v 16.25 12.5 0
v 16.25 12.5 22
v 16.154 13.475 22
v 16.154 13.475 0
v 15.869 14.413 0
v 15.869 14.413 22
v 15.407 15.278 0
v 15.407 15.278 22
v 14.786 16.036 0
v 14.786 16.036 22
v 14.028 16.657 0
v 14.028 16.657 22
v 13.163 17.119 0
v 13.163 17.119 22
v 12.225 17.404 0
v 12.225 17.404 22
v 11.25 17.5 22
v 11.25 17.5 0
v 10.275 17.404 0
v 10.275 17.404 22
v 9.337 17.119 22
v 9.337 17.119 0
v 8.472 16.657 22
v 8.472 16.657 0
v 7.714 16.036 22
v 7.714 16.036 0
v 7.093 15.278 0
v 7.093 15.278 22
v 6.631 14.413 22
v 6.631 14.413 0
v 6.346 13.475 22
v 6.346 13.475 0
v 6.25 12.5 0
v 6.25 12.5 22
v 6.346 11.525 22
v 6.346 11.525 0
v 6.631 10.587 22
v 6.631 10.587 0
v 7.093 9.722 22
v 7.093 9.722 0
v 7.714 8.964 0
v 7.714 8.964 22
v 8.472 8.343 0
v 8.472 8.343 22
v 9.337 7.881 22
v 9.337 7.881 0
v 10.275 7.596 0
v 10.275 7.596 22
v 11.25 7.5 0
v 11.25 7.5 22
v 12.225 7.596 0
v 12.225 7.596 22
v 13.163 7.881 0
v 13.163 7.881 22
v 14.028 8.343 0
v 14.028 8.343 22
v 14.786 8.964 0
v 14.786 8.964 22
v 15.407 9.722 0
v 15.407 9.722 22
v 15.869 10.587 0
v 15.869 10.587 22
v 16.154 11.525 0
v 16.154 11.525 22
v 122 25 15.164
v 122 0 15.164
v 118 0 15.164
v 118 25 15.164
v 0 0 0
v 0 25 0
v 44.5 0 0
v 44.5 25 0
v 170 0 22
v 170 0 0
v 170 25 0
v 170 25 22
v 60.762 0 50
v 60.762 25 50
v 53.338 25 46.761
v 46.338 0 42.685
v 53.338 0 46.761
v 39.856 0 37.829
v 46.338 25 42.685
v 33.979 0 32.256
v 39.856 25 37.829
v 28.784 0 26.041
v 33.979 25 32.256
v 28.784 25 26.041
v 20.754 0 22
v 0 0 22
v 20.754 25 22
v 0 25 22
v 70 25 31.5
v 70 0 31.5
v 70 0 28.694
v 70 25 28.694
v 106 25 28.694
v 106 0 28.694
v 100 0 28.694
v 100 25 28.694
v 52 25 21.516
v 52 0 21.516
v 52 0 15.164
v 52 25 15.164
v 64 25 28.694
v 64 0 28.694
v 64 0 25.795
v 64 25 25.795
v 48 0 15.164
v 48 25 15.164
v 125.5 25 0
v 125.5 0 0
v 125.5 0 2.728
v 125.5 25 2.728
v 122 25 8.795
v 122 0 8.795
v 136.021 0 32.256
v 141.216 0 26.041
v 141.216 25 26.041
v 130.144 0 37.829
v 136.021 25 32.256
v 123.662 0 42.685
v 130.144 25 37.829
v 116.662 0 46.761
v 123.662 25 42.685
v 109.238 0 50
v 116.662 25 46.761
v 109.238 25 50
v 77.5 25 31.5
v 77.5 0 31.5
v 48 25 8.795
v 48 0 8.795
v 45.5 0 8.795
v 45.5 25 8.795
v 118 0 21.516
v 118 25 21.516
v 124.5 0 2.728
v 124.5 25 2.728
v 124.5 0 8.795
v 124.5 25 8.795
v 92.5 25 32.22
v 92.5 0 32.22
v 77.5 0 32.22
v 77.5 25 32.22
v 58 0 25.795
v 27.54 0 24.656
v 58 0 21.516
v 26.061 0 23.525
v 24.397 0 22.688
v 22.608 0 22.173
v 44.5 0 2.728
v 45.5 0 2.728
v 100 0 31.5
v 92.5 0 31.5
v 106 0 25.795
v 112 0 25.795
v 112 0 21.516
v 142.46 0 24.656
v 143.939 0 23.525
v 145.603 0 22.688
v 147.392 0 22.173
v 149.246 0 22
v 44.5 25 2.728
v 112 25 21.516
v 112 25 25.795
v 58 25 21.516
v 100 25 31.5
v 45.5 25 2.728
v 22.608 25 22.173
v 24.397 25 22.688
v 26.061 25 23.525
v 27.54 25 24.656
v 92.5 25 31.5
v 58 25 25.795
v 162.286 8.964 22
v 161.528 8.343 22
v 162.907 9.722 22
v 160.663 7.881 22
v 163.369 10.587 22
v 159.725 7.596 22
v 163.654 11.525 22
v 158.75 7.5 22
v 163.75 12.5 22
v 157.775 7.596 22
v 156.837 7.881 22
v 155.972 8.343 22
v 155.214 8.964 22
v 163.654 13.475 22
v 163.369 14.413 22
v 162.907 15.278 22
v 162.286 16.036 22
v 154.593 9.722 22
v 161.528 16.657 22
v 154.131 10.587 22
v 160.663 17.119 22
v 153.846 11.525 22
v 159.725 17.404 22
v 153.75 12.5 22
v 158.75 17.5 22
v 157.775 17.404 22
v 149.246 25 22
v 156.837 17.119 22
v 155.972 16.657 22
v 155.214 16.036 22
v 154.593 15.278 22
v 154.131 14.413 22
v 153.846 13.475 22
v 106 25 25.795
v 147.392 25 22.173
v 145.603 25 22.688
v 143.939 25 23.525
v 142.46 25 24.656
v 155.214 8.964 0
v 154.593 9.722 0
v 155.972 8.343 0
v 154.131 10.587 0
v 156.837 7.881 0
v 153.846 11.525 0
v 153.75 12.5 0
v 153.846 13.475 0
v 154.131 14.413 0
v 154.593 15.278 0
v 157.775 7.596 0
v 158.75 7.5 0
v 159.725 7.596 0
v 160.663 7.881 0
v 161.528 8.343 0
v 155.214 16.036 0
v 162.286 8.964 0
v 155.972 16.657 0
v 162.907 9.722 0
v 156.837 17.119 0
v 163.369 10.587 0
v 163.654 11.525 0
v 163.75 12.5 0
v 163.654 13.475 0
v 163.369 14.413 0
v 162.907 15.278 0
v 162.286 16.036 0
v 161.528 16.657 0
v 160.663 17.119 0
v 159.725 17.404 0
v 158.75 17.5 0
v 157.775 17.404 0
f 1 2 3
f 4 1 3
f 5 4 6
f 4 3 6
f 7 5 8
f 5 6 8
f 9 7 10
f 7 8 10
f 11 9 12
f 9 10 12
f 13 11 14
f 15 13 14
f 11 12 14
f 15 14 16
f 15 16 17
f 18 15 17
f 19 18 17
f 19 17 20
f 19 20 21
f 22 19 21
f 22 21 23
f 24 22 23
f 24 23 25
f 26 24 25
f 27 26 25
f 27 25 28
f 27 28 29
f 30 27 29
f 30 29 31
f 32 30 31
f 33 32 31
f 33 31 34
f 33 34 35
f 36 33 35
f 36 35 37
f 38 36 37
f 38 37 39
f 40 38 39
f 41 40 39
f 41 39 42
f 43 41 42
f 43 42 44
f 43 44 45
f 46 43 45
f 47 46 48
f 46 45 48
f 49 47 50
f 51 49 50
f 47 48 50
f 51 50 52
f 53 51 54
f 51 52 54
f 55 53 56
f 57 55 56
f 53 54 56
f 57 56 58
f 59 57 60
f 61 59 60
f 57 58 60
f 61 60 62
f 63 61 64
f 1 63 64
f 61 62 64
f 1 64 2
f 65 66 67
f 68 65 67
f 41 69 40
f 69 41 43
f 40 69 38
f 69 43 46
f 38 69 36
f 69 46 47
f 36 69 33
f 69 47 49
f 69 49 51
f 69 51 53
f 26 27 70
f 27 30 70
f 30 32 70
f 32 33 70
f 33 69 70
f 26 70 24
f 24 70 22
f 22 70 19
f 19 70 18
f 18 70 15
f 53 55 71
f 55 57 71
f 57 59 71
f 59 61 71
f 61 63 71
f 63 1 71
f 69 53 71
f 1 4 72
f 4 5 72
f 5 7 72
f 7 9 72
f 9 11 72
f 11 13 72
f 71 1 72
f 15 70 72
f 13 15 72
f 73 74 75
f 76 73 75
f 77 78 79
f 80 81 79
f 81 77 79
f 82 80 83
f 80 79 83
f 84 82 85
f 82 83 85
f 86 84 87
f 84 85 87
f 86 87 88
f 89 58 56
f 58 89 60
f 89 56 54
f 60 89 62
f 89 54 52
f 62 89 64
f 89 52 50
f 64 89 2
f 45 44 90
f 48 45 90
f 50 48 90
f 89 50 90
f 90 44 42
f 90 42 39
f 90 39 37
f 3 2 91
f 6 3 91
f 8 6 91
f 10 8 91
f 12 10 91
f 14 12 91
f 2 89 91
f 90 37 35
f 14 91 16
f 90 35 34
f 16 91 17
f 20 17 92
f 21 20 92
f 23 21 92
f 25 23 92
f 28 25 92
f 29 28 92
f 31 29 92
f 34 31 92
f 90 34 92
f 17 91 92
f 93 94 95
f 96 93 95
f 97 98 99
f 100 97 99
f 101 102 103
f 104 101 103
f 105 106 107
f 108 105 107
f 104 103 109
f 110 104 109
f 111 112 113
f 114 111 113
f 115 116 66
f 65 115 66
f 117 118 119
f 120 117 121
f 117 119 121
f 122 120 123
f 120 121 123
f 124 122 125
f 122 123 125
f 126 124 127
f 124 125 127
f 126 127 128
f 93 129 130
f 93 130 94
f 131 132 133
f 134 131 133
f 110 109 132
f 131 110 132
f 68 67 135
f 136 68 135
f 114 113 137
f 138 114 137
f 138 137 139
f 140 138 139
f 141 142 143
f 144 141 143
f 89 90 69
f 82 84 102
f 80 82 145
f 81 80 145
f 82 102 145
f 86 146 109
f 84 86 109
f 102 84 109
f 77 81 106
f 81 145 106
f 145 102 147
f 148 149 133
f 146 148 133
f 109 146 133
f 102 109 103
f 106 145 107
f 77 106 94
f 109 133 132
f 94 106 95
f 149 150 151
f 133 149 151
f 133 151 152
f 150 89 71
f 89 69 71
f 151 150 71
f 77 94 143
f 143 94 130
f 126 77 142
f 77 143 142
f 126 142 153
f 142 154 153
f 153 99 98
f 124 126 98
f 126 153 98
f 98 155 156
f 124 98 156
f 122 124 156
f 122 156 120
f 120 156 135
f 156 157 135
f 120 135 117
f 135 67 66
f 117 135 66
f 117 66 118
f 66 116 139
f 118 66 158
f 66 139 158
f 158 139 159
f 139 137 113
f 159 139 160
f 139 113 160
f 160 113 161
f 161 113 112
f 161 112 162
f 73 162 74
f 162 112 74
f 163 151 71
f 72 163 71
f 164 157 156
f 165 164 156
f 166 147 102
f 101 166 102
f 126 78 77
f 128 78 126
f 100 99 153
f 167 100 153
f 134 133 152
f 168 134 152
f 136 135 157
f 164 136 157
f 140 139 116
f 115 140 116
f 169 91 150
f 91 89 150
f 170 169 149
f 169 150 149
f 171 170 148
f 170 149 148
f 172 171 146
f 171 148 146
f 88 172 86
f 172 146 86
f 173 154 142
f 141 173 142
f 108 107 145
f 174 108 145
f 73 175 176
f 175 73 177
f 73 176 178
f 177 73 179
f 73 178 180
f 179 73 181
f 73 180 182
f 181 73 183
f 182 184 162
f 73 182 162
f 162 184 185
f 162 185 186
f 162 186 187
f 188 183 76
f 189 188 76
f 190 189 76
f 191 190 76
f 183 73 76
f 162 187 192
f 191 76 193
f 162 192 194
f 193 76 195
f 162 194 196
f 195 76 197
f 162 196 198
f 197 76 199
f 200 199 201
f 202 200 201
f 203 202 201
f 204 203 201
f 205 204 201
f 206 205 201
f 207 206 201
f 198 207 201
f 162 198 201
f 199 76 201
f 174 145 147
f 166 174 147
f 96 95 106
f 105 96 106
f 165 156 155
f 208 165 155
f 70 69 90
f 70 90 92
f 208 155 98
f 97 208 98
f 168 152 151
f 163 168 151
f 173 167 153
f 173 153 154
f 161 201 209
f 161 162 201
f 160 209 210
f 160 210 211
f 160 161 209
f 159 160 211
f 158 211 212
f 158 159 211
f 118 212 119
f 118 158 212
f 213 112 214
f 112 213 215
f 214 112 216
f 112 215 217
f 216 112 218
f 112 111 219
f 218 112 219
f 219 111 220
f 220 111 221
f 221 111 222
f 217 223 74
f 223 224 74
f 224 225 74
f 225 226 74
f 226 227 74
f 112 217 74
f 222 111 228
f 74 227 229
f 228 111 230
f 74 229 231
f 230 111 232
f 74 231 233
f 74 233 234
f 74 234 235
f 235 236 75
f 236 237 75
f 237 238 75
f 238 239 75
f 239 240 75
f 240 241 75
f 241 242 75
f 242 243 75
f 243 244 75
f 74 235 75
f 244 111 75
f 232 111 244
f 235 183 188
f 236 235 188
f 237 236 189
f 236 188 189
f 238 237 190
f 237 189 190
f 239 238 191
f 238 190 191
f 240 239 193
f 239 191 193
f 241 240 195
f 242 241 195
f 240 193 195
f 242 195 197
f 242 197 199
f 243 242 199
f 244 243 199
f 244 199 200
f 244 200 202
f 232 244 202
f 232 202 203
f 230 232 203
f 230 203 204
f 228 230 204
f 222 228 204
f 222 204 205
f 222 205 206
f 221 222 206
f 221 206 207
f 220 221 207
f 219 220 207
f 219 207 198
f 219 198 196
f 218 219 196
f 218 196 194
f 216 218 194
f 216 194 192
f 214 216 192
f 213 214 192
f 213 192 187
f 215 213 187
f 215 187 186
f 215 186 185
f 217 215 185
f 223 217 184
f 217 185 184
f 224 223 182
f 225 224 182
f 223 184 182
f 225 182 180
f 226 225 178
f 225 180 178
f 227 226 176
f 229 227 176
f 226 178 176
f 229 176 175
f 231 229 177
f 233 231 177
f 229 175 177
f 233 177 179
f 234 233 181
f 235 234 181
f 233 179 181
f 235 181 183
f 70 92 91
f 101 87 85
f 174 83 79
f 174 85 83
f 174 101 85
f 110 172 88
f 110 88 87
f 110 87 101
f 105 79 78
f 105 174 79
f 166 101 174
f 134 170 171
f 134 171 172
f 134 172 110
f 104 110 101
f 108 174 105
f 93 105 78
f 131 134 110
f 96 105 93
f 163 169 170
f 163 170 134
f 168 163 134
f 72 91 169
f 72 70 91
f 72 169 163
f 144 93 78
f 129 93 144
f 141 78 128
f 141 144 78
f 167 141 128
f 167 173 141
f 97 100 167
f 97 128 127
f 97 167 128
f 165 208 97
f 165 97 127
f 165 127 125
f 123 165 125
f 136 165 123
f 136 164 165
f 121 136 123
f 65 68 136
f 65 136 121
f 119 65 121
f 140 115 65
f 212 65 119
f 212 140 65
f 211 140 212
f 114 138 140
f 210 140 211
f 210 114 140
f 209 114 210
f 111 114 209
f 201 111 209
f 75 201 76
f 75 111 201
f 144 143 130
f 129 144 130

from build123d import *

# Parameters (mm, degrees)
F0_W     = 170
F0_H     = 25
F1_DEPTH = 50
F2_R     = 5
F3_DEPTH = 50.001
F5_DEPTH = 25.001
F7_DEPTH = 25.001
F8_R     = 10


with BuildPart() as f1:
    # F0 (on Top) → F1 (new body)
    with BuildSketch(Plane.XY):
        with Locations((85, 12.5)):
            Rectangle(F0_W, F0_H)
    extrude(amount=F1_DEPTH)

    # F2 (on face) → F3 (cut, through all)
    with BuildSketch(Plane.XY.offset(50)):
        with Locations((11.25, 12.5)):
            Circle(F2_R)
        with Locations((158.75, 12.5)):
            Circle(F2_R)
    extrude(amount=-F3_DEPTH, mode=Mode.SUBTRACT)

    # F4 (on face) → F5 (cut, through all)
    with BuildSketch(Plane.XZ):
        Polygon((100, 31.5), (92.5, 31.5), (92.5, 32.220282), (85, 32.220282), (77.5, 32.220282), (77.5, 31.5), (70, 31.5), (70, 28.694315), (64, 28.694315), (64, 25.794553), (58, 25.794553), (58, 21.515869), (52, 21.515869), (52, 15.164459), (48, 15.164459), (48, 8.794946), (45.5, 8.794946), (45.5, 2.727922), (44.5, 2.727922), (44.5, 0), (125.5, 0), (125.5, 2.727922), (124.5, 2.727922), (124.5, 8.794946), (122, 8.794946), (122, 15.164459), (118, 15.164459), (118, 21.515869), (112, 21.515869), (112, 25.794553), (106, 25.794553), (106, 28.694315), (100, 28.694315), align=None)
    extrude(amount=-F5_DEPTH, mode=Mode.SUBTRACT)

    # F6 (on face) → F7 (cut, through all)
    with BuildSketch(Plane(origin=(0, 25, 0), x_dir=(-1, 0, 0), z_dir=(0, 1, 0))):
        with BuildLine():
            Line((-170, 22), (-144, 22))
            ThreePointArc((-144, 22), (-128.910808, 38.844978), (-109.23843, 50))
            Line((-109.23843, 50), (-170, 50))
            Line((-170, 50), (-170, 22))
        make_face()
        with BuildLine():
            Line((-26, 22), (0, 22))
            Line((0, 22), (0, 50))
            Line((0, 50), (-60.76157, 50))
            ThreePointArc((-60.76157, 50), (-41.089192, 38.844978), (-26, 22))
        make_face()
    extrude(amount=-F7_DEPTH, mode=Mode.SUBTRACT)

    # F8
    f8_edges = [f1.edges().sort_by_distance(p)[0] for p in [
        (144, 12.5, 22),
        (26, 12.5, 22),
    ]]
    fillet(f8_edges, radius=F8_R)


solid = f1.part
